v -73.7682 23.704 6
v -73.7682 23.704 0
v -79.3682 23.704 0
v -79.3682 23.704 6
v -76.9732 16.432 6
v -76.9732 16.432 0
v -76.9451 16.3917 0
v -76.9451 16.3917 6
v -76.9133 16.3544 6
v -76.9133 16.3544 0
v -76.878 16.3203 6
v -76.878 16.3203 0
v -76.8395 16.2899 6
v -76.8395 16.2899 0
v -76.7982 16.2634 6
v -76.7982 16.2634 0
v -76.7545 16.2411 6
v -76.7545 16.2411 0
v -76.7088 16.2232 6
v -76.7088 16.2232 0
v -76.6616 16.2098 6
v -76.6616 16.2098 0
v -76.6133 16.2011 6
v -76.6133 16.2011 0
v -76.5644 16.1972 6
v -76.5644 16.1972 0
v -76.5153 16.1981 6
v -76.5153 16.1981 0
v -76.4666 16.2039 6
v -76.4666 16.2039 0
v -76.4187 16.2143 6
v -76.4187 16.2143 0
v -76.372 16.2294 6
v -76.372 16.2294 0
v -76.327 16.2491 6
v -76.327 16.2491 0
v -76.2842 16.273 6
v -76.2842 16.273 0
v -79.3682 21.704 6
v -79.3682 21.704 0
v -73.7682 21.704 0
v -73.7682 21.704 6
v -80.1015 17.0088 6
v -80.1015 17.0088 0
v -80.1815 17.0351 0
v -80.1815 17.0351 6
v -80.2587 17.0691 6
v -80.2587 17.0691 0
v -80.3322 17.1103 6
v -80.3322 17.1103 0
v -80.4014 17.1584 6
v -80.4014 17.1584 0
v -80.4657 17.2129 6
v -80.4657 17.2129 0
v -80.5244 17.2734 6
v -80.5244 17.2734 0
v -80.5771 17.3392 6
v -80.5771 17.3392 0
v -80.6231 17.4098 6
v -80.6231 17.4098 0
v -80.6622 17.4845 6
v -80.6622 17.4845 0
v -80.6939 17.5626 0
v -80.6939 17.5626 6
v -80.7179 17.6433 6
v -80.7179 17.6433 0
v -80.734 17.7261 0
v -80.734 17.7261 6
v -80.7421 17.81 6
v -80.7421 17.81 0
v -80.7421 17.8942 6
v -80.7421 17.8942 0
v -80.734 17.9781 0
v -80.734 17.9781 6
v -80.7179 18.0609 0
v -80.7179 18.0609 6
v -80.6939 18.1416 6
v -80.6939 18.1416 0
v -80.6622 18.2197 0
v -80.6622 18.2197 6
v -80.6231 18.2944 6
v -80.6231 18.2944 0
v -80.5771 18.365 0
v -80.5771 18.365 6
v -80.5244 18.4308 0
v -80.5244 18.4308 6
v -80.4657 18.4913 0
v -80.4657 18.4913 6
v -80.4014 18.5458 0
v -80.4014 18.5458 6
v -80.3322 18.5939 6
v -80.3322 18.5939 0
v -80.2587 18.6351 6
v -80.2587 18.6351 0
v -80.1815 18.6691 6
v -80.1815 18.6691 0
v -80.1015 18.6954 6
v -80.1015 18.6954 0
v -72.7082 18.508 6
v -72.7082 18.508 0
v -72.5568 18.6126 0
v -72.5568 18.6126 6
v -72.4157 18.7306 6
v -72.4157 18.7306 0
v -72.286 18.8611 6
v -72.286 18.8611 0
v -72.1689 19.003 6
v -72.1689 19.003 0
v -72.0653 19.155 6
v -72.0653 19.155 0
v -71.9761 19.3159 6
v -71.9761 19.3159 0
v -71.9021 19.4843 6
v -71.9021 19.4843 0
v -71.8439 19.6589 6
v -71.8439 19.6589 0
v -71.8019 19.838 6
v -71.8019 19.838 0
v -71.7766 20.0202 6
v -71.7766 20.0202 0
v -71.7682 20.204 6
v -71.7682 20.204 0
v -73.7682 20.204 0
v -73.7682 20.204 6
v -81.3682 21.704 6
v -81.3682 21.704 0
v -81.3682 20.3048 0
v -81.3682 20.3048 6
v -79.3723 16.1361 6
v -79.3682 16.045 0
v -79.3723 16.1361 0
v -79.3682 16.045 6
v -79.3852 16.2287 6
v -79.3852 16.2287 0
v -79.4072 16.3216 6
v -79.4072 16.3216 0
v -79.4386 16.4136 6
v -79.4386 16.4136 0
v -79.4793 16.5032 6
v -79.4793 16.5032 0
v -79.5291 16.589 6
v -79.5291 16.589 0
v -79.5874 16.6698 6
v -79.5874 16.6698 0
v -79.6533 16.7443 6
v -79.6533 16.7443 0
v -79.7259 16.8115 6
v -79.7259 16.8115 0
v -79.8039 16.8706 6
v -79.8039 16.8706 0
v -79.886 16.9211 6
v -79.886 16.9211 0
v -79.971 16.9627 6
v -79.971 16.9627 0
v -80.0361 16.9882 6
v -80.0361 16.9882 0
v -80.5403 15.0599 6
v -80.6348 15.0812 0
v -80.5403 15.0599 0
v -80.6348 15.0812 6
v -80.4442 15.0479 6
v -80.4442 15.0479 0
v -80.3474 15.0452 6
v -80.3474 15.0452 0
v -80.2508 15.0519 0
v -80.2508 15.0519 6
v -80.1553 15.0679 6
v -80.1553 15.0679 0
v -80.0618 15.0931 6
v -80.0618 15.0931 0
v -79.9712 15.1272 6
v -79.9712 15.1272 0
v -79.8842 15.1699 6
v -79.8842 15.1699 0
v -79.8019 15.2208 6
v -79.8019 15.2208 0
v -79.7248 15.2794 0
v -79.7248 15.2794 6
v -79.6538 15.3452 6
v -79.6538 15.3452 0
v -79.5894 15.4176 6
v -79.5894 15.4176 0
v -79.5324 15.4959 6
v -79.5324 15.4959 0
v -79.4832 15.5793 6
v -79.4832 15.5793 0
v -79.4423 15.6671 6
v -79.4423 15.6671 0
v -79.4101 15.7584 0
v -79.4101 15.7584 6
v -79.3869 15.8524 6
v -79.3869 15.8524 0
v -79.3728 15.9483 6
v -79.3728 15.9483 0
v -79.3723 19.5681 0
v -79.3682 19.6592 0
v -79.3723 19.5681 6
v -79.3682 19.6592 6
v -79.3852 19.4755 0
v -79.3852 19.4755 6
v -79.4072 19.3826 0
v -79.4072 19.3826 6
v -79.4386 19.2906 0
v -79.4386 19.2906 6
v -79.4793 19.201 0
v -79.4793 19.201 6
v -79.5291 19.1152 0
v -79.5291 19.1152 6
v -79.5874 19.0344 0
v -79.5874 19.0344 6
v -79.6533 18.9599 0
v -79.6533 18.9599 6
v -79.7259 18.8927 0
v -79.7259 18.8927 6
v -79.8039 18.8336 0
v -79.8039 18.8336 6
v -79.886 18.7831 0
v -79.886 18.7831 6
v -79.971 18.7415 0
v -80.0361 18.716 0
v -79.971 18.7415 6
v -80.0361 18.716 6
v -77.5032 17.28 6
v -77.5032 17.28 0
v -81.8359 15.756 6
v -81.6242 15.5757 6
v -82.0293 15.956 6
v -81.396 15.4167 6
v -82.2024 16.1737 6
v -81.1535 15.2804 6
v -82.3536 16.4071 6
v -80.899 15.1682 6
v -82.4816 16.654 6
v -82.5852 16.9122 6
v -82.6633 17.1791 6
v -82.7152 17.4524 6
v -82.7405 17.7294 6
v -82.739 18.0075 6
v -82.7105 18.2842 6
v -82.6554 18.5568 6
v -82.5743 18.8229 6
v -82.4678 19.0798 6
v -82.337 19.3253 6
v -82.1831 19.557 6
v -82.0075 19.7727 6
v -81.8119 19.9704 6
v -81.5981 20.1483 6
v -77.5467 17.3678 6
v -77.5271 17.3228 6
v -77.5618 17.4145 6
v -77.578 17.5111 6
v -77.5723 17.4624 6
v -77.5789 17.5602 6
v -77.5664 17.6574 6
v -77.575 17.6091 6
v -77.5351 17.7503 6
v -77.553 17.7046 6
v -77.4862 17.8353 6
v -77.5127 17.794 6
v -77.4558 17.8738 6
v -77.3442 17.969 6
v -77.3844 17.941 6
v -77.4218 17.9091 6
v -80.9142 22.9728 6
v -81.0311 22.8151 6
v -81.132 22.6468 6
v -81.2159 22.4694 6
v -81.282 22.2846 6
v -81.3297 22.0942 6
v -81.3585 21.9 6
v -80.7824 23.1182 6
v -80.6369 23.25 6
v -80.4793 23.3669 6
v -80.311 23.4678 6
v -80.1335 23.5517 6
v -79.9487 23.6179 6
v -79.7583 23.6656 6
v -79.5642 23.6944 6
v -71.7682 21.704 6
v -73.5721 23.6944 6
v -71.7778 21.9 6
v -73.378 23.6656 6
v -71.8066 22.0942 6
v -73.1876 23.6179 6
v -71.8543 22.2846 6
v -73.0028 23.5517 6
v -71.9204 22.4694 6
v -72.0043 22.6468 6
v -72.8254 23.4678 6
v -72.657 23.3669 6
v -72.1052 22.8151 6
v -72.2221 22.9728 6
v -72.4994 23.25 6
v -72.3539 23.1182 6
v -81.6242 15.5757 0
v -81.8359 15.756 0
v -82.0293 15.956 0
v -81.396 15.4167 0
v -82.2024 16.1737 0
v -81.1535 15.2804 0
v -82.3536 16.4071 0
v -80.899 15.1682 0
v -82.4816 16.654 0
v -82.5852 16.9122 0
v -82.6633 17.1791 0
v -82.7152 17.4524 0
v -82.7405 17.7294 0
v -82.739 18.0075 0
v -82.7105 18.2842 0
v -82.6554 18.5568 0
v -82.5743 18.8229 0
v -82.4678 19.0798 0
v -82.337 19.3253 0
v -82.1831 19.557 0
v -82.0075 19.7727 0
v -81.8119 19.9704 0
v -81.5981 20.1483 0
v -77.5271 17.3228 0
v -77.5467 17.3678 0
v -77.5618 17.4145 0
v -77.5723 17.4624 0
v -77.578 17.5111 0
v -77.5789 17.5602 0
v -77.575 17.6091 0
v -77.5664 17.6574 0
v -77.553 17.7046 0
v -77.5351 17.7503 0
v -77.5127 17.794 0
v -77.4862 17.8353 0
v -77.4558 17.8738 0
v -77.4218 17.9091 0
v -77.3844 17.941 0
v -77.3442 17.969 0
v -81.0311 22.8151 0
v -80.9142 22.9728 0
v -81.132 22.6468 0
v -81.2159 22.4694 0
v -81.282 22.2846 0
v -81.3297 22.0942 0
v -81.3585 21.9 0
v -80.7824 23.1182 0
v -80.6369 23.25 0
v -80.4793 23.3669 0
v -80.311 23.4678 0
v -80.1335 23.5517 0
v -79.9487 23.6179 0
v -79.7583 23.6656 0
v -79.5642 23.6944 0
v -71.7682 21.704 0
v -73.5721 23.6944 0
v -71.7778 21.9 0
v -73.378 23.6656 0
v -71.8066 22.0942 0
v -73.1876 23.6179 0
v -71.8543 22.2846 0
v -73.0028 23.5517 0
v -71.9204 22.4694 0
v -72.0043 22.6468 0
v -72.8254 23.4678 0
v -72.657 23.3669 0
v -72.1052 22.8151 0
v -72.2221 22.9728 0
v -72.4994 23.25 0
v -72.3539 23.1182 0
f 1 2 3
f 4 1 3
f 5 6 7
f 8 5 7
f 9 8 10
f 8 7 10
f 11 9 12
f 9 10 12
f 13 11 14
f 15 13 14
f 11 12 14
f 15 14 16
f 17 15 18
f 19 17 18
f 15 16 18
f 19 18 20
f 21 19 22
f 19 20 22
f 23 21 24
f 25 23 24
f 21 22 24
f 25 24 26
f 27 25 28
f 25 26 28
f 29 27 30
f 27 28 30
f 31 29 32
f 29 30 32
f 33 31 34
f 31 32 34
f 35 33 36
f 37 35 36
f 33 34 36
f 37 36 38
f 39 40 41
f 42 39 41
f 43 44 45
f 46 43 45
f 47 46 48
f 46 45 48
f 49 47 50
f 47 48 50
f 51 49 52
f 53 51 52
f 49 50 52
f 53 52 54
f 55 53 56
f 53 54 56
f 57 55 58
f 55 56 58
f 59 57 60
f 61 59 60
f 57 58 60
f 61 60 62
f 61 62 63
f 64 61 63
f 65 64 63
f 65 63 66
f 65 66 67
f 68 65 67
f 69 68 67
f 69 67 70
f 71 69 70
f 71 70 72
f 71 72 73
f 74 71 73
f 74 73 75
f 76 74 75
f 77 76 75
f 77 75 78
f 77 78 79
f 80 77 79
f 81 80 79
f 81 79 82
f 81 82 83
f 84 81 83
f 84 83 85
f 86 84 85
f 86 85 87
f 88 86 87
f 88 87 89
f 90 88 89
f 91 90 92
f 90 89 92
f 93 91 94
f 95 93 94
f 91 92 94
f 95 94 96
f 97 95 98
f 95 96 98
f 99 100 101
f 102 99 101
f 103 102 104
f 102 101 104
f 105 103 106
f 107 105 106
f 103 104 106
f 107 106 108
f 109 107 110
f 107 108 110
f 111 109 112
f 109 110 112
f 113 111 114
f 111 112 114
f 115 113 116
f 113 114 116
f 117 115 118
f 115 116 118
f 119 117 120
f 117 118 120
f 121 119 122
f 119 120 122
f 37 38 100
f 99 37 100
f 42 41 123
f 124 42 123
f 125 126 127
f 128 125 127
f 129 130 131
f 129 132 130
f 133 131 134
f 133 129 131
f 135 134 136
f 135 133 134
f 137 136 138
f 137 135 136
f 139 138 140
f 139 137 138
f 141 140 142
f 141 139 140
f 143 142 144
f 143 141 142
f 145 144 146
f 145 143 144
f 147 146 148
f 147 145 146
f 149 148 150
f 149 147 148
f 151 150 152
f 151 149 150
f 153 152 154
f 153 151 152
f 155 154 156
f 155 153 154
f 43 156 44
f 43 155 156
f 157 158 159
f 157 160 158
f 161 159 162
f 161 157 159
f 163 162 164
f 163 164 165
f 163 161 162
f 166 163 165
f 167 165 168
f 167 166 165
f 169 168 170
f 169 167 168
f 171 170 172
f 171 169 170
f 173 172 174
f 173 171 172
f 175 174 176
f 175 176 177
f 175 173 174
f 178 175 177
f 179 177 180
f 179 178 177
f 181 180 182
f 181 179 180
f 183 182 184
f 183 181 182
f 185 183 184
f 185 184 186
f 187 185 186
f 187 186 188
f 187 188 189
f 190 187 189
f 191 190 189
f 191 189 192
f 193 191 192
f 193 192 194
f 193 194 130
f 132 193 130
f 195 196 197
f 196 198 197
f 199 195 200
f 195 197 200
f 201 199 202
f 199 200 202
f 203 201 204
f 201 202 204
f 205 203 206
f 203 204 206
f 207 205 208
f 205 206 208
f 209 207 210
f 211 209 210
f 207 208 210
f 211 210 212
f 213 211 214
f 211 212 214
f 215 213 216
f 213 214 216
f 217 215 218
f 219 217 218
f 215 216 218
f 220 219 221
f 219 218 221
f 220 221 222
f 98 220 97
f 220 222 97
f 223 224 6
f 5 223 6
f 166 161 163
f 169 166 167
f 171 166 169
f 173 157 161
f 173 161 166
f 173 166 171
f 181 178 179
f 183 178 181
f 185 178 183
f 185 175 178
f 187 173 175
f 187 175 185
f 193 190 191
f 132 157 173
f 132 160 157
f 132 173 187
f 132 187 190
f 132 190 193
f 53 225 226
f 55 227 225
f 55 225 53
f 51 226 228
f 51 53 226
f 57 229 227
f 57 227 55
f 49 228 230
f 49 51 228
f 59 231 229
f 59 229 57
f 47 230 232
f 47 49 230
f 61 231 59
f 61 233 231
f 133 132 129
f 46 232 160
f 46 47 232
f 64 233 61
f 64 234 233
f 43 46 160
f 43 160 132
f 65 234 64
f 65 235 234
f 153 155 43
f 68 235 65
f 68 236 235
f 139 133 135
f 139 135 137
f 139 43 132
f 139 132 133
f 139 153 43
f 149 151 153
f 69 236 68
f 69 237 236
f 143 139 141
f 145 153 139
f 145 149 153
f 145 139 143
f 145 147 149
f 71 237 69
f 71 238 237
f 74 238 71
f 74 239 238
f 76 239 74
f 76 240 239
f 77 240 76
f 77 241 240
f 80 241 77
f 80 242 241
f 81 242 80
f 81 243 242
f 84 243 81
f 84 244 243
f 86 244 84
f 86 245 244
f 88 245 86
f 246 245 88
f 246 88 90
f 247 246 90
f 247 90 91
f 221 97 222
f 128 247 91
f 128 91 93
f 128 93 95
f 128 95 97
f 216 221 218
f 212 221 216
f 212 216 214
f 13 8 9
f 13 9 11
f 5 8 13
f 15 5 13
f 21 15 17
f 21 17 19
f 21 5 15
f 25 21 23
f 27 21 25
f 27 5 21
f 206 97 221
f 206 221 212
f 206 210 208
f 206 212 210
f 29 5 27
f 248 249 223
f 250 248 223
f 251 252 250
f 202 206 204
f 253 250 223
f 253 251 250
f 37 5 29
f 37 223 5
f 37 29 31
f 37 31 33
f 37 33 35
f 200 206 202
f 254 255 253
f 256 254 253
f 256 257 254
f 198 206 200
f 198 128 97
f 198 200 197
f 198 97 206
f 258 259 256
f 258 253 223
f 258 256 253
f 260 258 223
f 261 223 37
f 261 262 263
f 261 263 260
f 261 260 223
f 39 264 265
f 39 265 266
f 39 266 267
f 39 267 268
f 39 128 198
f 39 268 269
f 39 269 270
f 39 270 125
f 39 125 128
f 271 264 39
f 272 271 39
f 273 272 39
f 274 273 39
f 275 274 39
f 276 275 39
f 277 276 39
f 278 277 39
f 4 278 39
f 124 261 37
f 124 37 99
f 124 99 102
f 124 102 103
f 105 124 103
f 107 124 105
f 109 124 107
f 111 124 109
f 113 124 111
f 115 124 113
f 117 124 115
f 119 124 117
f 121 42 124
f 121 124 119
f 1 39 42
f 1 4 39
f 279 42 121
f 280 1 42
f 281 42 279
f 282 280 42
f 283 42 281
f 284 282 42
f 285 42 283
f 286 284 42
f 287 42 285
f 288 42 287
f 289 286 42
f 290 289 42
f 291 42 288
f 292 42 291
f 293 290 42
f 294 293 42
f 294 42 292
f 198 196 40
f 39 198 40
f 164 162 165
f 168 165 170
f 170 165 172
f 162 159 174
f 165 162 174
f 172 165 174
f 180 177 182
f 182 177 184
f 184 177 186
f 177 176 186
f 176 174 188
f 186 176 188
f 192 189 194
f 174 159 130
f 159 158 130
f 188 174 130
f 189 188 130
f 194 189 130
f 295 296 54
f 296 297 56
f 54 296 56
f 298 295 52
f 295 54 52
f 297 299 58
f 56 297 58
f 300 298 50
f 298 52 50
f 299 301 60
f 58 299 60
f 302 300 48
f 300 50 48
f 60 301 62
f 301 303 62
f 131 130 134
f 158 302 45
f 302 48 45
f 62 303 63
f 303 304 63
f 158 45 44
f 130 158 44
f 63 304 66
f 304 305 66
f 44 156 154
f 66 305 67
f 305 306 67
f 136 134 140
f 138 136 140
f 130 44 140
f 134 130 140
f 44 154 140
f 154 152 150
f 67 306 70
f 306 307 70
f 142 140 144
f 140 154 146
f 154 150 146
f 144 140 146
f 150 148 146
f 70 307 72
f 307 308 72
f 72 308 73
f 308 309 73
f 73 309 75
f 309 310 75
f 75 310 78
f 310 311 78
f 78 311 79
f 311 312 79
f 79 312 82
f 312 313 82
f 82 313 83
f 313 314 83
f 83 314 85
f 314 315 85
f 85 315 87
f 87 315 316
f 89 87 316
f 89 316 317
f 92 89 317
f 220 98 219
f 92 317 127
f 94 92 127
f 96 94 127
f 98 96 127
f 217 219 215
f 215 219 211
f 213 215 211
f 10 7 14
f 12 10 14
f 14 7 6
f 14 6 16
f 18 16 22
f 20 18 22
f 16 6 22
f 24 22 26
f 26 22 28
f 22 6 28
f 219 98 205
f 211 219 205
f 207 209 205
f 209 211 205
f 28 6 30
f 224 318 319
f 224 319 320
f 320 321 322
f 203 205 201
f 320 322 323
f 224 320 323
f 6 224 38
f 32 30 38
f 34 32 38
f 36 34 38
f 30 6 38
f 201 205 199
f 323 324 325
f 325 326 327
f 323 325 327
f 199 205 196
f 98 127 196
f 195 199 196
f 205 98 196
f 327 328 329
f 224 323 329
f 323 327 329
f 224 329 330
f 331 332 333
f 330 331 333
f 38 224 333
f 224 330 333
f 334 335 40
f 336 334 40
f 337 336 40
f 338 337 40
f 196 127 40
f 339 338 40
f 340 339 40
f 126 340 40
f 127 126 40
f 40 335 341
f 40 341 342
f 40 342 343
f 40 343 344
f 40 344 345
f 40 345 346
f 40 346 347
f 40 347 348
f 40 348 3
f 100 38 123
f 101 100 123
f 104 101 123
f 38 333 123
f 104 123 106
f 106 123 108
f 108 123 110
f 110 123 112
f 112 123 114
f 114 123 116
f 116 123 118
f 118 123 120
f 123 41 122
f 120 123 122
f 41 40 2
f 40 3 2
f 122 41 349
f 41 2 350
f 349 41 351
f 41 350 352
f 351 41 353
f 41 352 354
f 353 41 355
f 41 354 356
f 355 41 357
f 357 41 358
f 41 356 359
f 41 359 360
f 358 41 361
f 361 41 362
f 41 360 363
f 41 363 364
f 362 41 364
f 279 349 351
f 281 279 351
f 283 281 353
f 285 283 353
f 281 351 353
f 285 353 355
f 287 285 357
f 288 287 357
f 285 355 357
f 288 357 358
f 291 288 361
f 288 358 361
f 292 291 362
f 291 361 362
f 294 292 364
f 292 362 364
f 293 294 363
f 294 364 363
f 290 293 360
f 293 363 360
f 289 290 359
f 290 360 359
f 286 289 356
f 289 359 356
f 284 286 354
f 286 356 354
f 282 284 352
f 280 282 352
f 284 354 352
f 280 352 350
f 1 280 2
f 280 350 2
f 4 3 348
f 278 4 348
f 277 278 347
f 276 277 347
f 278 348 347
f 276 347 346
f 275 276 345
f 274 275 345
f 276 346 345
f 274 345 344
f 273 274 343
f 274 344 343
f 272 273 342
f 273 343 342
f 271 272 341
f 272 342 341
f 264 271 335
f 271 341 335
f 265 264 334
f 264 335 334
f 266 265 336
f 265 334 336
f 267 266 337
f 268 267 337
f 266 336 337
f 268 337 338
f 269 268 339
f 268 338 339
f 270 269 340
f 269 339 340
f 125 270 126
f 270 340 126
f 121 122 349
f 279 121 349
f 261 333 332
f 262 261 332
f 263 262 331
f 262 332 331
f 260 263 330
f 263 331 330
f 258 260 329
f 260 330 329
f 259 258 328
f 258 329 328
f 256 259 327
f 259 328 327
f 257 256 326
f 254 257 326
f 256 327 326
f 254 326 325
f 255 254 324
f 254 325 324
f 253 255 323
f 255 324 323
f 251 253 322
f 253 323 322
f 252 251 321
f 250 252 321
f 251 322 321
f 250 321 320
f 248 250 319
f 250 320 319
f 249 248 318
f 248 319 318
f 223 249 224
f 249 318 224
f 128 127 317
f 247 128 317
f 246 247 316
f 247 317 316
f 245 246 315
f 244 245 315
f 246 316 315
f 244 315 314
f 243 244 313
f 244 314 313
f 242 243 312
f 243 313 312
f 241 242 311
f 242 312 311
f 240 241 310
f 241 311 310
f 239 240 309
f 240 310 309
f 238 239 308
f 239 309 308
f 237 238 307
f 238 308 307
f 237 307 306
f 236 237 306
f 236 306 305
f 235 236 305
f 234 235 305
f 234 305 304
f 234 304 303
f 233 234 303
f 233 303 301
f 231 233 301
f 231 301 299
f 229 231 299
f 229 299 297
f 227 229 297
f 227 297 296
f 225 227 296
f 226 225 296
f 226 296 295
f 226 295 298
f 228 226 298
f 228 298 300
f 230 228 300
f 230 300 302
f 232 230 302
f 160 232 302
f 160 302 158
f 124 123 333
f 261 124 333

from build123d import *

# Parameters (mm, degrees)
F1_DEPTH = 6
F2_R     = 0.99999


# Not quite as in the source:
# - a fillet or chamfer is up to 0.001 mm smaller than in the source, because OpenCascade refuses the exact size


with BuildPart() as f1:
    # F0 (on Top) → F1 (new body)
    with BuildSketch(Plane.XY):
        with BuildLine():
            Line((-79.3681601882, 18.7270958871), (-79.3681601882, 21.703983524))
            Line((-79.3681601882, 21.703983524), (-73.7681601882, 21.703983524))
            Line((-73.7681601882, 21.703983524), (-73.7681601882, 20.203983524))
            Line((-73.7681601882, 20.203983524), (-77.3441610362, 17.968982994))
            ThreePointArc((-77.3441610362, 17.968982994), (-77.566357164, 17.6574135954), (-77.5031607182, 17.279984372))
            Line((-77.5031607182, 17.279984372), (-76.9731617782, 16.431986068))
            ThreePointArc((-76.9731617782, 16.431986068), (-76.6615923795, 16.2097899402), (-76.2841631562, 16.272986386))
            Line((-76.2841631562, 16.272986386), (-72.7081623082, 18.507986916))
            ThreePointArc((-72.7081623082, 18.507986916), (-72.0188752257, 19.2344464592), (-71.7681601882, 20.203983524))
            Line((-71.7681601882, 20.203983524), (-71.7681601882, 21.703983524))
            ThreePointArc((-71.7681601882, 21.703983524), (-72.3539466258, 23.1181970864), (-73.7681601882, 23.703983524))
            Line((-73.7681601882, 23.703983524), (-79.3681601882, 23.703983524))
            ThreePointArc((-79.3681601882, 23.703983524), (-80.7823737506, 23.1181970864), (-81.3681601882, 21.703983524))
            Line((-81.3681601882, 21.703983524), (-81.3681601882, 20.3047729959))
            ThreePointArc((-81.3681601882, 20.3047729959), (-82.5569903042, 16.8343446369), (-79.3681601882, 15.0209079738))
            Line((-79.3681601882, 15.0209079738), (-79.3681601882, 16.9770958871))
            Line((-79.3681601882, 16.9770958871), (-79.8681601882, 16.9770958871))
            ThreePointArc((-79.8681601882, 16.9770958871), (-80.7431601882, 17.8520958871), (-79.8681601882, 18.7270958871))
            Line((-79.8681601882, 18.7270958871), (-79.3681601882, 18.7270958871))
        make_face()
    extrude(amount=F1_DEPTH)

    # F2 (radius 1 in the source; OpenCascade refuses exactly that, so slightly less here)
    f2_edges = [f1.edges().sort_by_distance(p)[0] for p in [
        (-79.36816, 15.020908, 3),
        (-79.36816, 18.727096, 3),
        (-79.36816, 16.977096, 3),
    ]]
    fillet(f2_edges, radius=F2_R)


solid = f1.part
